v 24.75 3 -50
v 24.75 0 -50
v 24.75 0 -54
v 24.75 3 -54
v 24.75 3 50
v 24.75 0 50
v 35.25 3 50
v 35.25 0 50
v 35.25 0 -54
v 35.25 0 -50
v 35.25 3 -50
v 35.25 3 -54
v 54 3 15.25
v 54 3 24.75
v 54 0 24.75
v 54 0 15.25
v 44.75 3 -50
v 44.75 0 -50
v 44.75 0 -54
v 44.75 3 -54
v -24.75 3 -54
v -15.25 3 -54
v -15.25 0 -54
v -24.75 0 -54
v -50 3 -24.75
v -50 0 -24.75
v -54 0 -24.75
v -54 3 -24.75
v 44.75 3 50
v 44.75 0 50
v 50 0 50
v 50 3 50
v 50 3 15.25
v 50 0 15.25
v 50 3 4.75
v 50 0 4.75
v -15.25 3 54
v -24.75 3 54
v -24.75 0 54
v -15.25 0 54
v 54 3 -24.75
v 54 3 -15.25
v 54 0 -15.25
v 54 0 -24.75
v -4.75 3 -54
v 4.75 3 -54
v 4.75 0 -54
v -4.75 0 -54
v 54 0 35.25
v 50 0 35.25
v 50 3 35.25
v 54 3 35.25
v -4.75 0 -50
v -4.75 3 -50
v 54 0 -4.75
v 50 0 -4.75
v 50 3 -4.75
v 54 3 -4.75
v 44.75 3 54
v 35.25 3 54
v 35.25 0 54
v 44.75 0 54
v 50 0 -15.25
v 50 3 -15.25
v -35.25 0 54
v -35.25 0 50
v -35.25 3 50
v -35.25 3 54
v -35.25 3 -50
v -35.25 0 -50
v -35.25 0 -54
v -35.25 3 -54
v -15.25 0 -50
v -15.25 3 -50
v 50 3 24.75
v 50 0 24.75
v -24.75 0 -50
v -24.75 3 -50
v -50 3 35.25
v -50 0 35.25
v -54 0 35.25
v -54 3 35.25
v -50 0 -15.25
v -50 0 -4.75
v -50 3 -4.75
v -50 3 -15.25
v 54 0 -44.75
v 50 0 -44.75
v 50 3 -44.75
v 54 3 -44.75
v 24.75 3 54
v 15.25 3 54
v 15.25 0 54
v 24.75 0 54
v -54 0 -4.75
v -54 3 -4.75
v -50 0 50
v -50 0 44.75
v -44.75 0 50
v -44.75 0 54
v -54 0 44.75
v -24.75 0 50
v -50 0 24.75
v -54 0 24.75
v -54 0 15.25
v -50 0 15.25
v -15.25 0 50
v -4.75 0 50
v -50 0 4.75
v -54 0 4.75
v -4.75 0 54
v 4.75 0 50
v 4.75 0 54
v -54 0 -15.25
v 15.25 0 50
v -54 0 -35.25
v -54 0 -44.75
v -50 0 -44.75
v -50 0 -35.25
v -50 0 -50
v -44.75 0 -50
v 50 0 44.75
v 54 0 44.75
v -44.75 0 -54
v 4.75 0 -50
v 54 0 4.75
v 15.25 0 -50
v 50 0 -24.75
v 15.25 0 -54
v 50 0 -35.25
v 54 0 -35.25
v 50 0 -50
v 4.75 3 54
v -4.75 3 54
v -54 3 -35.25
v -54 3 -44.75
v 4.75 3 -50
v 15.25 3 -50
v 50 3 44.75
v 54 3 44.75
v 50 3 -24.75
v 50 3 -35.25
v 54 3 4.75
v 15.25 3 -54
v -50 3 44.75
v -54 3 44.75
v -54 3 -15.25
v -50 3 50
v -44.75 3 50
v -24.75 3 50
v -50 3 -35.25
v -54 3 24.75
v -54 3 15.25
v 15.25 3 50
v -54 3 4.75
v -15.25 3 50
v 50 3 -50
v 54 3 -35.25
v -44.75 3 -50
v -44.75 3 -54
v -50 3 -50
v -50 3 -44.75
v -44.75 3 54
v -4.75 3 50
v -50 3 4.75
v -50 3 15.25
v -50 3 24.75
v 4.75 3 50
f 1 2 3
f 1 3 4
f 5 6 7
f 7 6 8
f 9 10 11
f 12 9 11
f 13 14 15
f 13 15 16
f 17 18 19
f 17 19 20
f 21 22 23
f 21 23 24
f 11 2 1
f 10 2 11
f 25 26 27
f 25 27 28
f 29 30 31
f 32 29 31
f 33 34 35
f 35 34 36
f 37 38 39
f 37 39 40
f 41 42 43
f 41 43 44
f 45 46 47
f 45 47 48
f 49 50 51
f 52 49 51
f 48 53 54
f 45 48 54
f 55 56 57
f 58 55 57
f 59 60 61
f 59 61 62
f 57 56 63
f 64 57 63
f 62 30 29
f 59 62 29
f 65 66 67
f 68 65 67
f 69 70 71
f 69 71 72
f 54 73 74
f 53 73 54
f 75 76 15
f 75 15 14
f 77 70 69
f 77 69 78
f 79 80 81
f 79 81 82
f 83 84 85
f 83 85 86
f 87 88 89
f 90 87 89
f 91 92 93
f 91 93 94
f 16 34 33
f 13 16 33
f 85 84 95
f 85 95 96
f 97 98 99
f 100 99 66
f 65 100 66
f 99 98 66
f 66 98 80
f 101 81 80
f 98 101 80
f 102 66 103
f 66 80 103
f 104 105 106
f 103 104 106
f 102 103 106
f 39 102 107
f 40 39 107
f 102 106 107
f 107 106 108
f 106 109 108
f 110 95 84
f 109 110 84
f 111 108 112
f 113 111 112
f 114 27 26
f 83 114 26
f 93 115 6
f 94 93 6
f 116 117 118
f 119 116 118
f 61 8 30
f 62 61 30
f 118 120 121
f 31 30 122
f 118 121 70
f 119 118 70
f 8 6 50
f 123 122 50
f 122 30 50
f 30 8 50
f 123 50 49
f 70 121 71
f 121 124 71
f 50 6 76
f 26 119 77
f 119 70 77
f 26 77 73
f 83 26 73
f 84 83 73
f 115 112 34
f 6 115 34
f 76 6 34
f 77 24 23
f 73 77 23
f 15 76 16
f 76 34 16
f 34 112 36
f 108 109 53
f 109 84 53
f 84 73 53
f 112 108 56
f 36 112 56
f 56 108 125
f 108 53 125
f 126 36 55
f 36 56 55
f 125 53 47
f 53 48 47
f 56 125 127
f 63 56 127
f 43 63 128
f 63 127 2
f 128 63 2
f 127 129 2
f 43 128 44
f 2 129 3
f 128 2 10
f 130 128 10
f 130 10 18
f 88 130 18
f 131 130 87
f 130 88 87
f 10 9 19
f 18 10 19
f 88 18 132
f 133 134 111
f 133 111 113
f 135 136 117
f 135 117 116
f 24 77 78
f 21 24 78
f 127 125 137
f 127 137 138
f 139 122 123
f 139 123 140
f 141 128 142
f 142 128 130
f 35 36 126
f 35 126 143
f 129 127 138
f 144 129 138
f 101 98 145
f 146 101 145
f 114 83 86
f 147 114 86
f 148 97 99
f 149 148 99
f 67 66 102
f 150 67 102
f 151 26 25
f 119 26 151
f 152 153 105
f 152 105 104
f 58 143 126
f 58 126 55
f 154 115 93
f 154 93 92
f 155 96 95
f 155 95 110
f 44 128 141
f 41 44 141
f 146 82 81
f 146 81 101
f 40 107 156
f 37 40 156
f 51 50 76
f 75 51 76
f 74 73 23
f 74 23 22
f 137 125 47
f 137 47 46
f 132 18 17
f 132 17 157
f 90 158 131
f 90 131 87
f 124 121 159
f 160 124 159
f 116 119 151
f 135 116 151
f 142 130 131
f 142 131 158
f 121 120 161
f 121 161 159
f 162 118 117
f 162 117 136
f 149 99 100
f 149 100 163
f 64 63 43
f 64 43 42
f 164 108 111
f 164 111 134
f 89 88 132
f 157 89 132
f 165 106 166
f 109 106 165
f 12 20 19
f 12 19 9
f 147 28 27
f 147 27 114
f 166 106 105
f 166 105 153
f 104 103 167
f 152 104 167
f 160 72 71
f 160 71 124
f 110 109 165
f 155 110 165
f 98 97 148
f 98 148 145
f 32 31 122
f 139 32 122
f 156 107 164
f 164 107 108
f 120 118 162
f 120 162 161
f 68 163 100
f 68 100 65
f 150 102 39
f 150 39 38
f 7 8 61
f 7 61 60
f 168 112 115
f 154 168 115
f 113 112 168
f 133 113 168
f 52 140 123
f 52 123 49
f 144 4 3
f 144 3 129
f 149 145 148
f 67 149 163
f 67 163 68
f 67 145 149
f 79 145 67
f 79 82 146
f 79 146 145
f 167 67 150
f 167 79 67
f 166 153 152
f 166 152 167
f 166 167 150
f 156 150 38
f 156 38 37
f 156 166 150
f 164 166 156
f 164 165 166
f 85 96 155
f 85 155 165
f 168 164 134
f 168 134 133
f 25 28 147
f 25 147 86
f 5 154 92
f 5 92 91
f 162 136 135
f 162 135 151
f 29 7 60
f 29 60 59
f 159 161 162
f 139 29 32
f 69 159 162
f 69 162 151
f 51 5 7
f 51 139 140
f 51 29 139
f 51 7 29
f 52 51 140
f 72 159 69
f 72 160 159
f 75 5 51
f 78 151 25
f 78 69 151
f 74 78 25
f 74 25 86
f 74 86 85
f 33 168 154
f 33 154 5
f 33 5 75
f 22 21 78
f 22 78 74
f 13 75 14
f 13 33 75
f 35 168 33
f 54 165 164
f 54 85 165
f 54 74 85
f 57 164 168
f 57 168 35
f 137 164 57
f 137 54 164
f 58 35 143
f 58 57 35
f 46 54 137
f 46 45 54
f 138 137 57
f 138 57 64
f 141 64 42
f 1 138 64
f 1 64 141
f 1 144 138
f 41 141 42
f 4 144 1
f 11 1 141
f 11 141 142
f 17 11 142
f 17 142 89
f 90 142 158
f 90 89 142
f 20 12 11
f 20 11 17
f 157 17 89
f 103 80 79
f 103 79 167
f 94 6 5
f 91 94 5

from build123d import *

# Parameters (mm, degrees)
SKETCH2_W           = 100
SKETCH2_H           = 100
BOSS_EXTRUDE1_DEPTH = 3
SKETCH4_W           = 9.5
SKETCH4_H           = 3
BOSS_EXTRUDE2_DEPTH = 4
SKETCH5_W           = 9.5
SKETCH5_H           = 3
BOSS_EXTRUDE3_DEPTH = 4
SKETCH6_W           = 9.5
SKETCH6_H           = 3
BOSS_EXTRUDE4_DEPTH = 4
SKETCH7_W           = 9.5
SKETCH7_H           = 3
BOSS_EXTRUDE5_DEPTH = 4


with BuildPart() as part:
    # Sketch2 → Boss-Extrude1 (new body)
    with BuildSketch(Plane(origin=(0, 0, 0), x_dir=(1, 0, 0), z_dir=(0, 1, 0))):
        Rectangle(SKETCH2_W, SKETCH2_H)
    extrude(amount=BOSS_EXTRUDE1_DEPTH)

    # Sketch4 → Boss-Extrude2 (add)
    with BuildSketch(Plane.XY.offset(50)):
        with Locations((-40, 1.5)):
            Rectangle(SKETCH4_W, SKETCH4_H)
        with Locations((-20, 1.5)):
            Rectangle(SKETCH4_W, SKETCH4_H)
        with Locations((0, 1.5)):
            Rectangle(SKETCH4_W, SKETCH4_H)
        with Locations((20, 1.5)):
            Rectangle(SKETCH4_W, SKETCH4_H)
        with Locations((40, 1.5)):
            Rectangle(SKETCH4_W, SKETCH4_H)
    extrude(amount=BOSS_EXTRUDE2_DEPTH)

    # Sketch5 → Boss-Extrude3 (add)
    with BuildSketch(Plane.ZY.offset(50)):
        with Locations((-40, 1.5)):
            Rectangle(SKETCH5_W, SKETCH5_H)
        with Locations((-20, 1.5)):
            Rectangle(SKETCH5_W, SKETCH5_H)
        with Locations((0, 1.5)):
            Rectangle(SKETCH5_W, SKETCH5_H)
        with Locations((20, 1.5)):
            Rectangle(SKETCH5_W, SKETCH5_H)
        with Locations((40, 1.5)):
            Rectangle(SKETCH5_W, SKETCH5_H)
    extrude(amount=BOSS_EXTRUDE3_DEPTH)

    # Sketch6 → Boss-Extrude4 (add)
    with BuildSketch(Plane(origin=(50, 0, 0), x_dir=(0, 0, -1), z_dir=(1, 0, 0))):
        with Locations((-40, 1.5)):
            Rectangle(SKETCH6_W, SKETCH6_H)
        with Locations((-20, 1.5)):
            Rectangle(SKETCH6_W, SKETCH6_H)
        with Locations((0, 1.5)):
            Rectangle(SKETCH6_W, SKETCH6_H)
        with Locations((20, 1.5)):
            Rectangle(SKETCH6_W, SKETCH6_H)
        with Locations((40, 1.5)):
            Rectangle(SKETCH6_W, SKETCH6_H)
    extrude(amount=BOSS_EXTRUDE4_DEPTH)

    # Sketch7 → Boss-Extrude5 (add)
    with BuildSketch(Plane(origin=(0, 0, -50), x_dir=(-1, 0, 0), z_dir=(0, 0, -1))):
        with Locations((-40, 1.5)):
            Rectangle(SKETCH7_W, SKETCH7_H)
        with Locations((-20, 1.5)):
            Rectangle(SKETCH7_W, SKETCH7_H)
        with Locations((0, 1.5)):
            Rectangle(SKETCH7_W, SKETCH7_H)
        with Locations((20, 1.5)):
            Rectangle(SKETCH7_W, SKETCH7_H)
        with Locations((40, 1.5)):
            Rectangle(SKETCH7_W, SKETCH7_H)
    extrude(amount=BOSS_EXTRUDE5_DEPTH)


solid = part.part
